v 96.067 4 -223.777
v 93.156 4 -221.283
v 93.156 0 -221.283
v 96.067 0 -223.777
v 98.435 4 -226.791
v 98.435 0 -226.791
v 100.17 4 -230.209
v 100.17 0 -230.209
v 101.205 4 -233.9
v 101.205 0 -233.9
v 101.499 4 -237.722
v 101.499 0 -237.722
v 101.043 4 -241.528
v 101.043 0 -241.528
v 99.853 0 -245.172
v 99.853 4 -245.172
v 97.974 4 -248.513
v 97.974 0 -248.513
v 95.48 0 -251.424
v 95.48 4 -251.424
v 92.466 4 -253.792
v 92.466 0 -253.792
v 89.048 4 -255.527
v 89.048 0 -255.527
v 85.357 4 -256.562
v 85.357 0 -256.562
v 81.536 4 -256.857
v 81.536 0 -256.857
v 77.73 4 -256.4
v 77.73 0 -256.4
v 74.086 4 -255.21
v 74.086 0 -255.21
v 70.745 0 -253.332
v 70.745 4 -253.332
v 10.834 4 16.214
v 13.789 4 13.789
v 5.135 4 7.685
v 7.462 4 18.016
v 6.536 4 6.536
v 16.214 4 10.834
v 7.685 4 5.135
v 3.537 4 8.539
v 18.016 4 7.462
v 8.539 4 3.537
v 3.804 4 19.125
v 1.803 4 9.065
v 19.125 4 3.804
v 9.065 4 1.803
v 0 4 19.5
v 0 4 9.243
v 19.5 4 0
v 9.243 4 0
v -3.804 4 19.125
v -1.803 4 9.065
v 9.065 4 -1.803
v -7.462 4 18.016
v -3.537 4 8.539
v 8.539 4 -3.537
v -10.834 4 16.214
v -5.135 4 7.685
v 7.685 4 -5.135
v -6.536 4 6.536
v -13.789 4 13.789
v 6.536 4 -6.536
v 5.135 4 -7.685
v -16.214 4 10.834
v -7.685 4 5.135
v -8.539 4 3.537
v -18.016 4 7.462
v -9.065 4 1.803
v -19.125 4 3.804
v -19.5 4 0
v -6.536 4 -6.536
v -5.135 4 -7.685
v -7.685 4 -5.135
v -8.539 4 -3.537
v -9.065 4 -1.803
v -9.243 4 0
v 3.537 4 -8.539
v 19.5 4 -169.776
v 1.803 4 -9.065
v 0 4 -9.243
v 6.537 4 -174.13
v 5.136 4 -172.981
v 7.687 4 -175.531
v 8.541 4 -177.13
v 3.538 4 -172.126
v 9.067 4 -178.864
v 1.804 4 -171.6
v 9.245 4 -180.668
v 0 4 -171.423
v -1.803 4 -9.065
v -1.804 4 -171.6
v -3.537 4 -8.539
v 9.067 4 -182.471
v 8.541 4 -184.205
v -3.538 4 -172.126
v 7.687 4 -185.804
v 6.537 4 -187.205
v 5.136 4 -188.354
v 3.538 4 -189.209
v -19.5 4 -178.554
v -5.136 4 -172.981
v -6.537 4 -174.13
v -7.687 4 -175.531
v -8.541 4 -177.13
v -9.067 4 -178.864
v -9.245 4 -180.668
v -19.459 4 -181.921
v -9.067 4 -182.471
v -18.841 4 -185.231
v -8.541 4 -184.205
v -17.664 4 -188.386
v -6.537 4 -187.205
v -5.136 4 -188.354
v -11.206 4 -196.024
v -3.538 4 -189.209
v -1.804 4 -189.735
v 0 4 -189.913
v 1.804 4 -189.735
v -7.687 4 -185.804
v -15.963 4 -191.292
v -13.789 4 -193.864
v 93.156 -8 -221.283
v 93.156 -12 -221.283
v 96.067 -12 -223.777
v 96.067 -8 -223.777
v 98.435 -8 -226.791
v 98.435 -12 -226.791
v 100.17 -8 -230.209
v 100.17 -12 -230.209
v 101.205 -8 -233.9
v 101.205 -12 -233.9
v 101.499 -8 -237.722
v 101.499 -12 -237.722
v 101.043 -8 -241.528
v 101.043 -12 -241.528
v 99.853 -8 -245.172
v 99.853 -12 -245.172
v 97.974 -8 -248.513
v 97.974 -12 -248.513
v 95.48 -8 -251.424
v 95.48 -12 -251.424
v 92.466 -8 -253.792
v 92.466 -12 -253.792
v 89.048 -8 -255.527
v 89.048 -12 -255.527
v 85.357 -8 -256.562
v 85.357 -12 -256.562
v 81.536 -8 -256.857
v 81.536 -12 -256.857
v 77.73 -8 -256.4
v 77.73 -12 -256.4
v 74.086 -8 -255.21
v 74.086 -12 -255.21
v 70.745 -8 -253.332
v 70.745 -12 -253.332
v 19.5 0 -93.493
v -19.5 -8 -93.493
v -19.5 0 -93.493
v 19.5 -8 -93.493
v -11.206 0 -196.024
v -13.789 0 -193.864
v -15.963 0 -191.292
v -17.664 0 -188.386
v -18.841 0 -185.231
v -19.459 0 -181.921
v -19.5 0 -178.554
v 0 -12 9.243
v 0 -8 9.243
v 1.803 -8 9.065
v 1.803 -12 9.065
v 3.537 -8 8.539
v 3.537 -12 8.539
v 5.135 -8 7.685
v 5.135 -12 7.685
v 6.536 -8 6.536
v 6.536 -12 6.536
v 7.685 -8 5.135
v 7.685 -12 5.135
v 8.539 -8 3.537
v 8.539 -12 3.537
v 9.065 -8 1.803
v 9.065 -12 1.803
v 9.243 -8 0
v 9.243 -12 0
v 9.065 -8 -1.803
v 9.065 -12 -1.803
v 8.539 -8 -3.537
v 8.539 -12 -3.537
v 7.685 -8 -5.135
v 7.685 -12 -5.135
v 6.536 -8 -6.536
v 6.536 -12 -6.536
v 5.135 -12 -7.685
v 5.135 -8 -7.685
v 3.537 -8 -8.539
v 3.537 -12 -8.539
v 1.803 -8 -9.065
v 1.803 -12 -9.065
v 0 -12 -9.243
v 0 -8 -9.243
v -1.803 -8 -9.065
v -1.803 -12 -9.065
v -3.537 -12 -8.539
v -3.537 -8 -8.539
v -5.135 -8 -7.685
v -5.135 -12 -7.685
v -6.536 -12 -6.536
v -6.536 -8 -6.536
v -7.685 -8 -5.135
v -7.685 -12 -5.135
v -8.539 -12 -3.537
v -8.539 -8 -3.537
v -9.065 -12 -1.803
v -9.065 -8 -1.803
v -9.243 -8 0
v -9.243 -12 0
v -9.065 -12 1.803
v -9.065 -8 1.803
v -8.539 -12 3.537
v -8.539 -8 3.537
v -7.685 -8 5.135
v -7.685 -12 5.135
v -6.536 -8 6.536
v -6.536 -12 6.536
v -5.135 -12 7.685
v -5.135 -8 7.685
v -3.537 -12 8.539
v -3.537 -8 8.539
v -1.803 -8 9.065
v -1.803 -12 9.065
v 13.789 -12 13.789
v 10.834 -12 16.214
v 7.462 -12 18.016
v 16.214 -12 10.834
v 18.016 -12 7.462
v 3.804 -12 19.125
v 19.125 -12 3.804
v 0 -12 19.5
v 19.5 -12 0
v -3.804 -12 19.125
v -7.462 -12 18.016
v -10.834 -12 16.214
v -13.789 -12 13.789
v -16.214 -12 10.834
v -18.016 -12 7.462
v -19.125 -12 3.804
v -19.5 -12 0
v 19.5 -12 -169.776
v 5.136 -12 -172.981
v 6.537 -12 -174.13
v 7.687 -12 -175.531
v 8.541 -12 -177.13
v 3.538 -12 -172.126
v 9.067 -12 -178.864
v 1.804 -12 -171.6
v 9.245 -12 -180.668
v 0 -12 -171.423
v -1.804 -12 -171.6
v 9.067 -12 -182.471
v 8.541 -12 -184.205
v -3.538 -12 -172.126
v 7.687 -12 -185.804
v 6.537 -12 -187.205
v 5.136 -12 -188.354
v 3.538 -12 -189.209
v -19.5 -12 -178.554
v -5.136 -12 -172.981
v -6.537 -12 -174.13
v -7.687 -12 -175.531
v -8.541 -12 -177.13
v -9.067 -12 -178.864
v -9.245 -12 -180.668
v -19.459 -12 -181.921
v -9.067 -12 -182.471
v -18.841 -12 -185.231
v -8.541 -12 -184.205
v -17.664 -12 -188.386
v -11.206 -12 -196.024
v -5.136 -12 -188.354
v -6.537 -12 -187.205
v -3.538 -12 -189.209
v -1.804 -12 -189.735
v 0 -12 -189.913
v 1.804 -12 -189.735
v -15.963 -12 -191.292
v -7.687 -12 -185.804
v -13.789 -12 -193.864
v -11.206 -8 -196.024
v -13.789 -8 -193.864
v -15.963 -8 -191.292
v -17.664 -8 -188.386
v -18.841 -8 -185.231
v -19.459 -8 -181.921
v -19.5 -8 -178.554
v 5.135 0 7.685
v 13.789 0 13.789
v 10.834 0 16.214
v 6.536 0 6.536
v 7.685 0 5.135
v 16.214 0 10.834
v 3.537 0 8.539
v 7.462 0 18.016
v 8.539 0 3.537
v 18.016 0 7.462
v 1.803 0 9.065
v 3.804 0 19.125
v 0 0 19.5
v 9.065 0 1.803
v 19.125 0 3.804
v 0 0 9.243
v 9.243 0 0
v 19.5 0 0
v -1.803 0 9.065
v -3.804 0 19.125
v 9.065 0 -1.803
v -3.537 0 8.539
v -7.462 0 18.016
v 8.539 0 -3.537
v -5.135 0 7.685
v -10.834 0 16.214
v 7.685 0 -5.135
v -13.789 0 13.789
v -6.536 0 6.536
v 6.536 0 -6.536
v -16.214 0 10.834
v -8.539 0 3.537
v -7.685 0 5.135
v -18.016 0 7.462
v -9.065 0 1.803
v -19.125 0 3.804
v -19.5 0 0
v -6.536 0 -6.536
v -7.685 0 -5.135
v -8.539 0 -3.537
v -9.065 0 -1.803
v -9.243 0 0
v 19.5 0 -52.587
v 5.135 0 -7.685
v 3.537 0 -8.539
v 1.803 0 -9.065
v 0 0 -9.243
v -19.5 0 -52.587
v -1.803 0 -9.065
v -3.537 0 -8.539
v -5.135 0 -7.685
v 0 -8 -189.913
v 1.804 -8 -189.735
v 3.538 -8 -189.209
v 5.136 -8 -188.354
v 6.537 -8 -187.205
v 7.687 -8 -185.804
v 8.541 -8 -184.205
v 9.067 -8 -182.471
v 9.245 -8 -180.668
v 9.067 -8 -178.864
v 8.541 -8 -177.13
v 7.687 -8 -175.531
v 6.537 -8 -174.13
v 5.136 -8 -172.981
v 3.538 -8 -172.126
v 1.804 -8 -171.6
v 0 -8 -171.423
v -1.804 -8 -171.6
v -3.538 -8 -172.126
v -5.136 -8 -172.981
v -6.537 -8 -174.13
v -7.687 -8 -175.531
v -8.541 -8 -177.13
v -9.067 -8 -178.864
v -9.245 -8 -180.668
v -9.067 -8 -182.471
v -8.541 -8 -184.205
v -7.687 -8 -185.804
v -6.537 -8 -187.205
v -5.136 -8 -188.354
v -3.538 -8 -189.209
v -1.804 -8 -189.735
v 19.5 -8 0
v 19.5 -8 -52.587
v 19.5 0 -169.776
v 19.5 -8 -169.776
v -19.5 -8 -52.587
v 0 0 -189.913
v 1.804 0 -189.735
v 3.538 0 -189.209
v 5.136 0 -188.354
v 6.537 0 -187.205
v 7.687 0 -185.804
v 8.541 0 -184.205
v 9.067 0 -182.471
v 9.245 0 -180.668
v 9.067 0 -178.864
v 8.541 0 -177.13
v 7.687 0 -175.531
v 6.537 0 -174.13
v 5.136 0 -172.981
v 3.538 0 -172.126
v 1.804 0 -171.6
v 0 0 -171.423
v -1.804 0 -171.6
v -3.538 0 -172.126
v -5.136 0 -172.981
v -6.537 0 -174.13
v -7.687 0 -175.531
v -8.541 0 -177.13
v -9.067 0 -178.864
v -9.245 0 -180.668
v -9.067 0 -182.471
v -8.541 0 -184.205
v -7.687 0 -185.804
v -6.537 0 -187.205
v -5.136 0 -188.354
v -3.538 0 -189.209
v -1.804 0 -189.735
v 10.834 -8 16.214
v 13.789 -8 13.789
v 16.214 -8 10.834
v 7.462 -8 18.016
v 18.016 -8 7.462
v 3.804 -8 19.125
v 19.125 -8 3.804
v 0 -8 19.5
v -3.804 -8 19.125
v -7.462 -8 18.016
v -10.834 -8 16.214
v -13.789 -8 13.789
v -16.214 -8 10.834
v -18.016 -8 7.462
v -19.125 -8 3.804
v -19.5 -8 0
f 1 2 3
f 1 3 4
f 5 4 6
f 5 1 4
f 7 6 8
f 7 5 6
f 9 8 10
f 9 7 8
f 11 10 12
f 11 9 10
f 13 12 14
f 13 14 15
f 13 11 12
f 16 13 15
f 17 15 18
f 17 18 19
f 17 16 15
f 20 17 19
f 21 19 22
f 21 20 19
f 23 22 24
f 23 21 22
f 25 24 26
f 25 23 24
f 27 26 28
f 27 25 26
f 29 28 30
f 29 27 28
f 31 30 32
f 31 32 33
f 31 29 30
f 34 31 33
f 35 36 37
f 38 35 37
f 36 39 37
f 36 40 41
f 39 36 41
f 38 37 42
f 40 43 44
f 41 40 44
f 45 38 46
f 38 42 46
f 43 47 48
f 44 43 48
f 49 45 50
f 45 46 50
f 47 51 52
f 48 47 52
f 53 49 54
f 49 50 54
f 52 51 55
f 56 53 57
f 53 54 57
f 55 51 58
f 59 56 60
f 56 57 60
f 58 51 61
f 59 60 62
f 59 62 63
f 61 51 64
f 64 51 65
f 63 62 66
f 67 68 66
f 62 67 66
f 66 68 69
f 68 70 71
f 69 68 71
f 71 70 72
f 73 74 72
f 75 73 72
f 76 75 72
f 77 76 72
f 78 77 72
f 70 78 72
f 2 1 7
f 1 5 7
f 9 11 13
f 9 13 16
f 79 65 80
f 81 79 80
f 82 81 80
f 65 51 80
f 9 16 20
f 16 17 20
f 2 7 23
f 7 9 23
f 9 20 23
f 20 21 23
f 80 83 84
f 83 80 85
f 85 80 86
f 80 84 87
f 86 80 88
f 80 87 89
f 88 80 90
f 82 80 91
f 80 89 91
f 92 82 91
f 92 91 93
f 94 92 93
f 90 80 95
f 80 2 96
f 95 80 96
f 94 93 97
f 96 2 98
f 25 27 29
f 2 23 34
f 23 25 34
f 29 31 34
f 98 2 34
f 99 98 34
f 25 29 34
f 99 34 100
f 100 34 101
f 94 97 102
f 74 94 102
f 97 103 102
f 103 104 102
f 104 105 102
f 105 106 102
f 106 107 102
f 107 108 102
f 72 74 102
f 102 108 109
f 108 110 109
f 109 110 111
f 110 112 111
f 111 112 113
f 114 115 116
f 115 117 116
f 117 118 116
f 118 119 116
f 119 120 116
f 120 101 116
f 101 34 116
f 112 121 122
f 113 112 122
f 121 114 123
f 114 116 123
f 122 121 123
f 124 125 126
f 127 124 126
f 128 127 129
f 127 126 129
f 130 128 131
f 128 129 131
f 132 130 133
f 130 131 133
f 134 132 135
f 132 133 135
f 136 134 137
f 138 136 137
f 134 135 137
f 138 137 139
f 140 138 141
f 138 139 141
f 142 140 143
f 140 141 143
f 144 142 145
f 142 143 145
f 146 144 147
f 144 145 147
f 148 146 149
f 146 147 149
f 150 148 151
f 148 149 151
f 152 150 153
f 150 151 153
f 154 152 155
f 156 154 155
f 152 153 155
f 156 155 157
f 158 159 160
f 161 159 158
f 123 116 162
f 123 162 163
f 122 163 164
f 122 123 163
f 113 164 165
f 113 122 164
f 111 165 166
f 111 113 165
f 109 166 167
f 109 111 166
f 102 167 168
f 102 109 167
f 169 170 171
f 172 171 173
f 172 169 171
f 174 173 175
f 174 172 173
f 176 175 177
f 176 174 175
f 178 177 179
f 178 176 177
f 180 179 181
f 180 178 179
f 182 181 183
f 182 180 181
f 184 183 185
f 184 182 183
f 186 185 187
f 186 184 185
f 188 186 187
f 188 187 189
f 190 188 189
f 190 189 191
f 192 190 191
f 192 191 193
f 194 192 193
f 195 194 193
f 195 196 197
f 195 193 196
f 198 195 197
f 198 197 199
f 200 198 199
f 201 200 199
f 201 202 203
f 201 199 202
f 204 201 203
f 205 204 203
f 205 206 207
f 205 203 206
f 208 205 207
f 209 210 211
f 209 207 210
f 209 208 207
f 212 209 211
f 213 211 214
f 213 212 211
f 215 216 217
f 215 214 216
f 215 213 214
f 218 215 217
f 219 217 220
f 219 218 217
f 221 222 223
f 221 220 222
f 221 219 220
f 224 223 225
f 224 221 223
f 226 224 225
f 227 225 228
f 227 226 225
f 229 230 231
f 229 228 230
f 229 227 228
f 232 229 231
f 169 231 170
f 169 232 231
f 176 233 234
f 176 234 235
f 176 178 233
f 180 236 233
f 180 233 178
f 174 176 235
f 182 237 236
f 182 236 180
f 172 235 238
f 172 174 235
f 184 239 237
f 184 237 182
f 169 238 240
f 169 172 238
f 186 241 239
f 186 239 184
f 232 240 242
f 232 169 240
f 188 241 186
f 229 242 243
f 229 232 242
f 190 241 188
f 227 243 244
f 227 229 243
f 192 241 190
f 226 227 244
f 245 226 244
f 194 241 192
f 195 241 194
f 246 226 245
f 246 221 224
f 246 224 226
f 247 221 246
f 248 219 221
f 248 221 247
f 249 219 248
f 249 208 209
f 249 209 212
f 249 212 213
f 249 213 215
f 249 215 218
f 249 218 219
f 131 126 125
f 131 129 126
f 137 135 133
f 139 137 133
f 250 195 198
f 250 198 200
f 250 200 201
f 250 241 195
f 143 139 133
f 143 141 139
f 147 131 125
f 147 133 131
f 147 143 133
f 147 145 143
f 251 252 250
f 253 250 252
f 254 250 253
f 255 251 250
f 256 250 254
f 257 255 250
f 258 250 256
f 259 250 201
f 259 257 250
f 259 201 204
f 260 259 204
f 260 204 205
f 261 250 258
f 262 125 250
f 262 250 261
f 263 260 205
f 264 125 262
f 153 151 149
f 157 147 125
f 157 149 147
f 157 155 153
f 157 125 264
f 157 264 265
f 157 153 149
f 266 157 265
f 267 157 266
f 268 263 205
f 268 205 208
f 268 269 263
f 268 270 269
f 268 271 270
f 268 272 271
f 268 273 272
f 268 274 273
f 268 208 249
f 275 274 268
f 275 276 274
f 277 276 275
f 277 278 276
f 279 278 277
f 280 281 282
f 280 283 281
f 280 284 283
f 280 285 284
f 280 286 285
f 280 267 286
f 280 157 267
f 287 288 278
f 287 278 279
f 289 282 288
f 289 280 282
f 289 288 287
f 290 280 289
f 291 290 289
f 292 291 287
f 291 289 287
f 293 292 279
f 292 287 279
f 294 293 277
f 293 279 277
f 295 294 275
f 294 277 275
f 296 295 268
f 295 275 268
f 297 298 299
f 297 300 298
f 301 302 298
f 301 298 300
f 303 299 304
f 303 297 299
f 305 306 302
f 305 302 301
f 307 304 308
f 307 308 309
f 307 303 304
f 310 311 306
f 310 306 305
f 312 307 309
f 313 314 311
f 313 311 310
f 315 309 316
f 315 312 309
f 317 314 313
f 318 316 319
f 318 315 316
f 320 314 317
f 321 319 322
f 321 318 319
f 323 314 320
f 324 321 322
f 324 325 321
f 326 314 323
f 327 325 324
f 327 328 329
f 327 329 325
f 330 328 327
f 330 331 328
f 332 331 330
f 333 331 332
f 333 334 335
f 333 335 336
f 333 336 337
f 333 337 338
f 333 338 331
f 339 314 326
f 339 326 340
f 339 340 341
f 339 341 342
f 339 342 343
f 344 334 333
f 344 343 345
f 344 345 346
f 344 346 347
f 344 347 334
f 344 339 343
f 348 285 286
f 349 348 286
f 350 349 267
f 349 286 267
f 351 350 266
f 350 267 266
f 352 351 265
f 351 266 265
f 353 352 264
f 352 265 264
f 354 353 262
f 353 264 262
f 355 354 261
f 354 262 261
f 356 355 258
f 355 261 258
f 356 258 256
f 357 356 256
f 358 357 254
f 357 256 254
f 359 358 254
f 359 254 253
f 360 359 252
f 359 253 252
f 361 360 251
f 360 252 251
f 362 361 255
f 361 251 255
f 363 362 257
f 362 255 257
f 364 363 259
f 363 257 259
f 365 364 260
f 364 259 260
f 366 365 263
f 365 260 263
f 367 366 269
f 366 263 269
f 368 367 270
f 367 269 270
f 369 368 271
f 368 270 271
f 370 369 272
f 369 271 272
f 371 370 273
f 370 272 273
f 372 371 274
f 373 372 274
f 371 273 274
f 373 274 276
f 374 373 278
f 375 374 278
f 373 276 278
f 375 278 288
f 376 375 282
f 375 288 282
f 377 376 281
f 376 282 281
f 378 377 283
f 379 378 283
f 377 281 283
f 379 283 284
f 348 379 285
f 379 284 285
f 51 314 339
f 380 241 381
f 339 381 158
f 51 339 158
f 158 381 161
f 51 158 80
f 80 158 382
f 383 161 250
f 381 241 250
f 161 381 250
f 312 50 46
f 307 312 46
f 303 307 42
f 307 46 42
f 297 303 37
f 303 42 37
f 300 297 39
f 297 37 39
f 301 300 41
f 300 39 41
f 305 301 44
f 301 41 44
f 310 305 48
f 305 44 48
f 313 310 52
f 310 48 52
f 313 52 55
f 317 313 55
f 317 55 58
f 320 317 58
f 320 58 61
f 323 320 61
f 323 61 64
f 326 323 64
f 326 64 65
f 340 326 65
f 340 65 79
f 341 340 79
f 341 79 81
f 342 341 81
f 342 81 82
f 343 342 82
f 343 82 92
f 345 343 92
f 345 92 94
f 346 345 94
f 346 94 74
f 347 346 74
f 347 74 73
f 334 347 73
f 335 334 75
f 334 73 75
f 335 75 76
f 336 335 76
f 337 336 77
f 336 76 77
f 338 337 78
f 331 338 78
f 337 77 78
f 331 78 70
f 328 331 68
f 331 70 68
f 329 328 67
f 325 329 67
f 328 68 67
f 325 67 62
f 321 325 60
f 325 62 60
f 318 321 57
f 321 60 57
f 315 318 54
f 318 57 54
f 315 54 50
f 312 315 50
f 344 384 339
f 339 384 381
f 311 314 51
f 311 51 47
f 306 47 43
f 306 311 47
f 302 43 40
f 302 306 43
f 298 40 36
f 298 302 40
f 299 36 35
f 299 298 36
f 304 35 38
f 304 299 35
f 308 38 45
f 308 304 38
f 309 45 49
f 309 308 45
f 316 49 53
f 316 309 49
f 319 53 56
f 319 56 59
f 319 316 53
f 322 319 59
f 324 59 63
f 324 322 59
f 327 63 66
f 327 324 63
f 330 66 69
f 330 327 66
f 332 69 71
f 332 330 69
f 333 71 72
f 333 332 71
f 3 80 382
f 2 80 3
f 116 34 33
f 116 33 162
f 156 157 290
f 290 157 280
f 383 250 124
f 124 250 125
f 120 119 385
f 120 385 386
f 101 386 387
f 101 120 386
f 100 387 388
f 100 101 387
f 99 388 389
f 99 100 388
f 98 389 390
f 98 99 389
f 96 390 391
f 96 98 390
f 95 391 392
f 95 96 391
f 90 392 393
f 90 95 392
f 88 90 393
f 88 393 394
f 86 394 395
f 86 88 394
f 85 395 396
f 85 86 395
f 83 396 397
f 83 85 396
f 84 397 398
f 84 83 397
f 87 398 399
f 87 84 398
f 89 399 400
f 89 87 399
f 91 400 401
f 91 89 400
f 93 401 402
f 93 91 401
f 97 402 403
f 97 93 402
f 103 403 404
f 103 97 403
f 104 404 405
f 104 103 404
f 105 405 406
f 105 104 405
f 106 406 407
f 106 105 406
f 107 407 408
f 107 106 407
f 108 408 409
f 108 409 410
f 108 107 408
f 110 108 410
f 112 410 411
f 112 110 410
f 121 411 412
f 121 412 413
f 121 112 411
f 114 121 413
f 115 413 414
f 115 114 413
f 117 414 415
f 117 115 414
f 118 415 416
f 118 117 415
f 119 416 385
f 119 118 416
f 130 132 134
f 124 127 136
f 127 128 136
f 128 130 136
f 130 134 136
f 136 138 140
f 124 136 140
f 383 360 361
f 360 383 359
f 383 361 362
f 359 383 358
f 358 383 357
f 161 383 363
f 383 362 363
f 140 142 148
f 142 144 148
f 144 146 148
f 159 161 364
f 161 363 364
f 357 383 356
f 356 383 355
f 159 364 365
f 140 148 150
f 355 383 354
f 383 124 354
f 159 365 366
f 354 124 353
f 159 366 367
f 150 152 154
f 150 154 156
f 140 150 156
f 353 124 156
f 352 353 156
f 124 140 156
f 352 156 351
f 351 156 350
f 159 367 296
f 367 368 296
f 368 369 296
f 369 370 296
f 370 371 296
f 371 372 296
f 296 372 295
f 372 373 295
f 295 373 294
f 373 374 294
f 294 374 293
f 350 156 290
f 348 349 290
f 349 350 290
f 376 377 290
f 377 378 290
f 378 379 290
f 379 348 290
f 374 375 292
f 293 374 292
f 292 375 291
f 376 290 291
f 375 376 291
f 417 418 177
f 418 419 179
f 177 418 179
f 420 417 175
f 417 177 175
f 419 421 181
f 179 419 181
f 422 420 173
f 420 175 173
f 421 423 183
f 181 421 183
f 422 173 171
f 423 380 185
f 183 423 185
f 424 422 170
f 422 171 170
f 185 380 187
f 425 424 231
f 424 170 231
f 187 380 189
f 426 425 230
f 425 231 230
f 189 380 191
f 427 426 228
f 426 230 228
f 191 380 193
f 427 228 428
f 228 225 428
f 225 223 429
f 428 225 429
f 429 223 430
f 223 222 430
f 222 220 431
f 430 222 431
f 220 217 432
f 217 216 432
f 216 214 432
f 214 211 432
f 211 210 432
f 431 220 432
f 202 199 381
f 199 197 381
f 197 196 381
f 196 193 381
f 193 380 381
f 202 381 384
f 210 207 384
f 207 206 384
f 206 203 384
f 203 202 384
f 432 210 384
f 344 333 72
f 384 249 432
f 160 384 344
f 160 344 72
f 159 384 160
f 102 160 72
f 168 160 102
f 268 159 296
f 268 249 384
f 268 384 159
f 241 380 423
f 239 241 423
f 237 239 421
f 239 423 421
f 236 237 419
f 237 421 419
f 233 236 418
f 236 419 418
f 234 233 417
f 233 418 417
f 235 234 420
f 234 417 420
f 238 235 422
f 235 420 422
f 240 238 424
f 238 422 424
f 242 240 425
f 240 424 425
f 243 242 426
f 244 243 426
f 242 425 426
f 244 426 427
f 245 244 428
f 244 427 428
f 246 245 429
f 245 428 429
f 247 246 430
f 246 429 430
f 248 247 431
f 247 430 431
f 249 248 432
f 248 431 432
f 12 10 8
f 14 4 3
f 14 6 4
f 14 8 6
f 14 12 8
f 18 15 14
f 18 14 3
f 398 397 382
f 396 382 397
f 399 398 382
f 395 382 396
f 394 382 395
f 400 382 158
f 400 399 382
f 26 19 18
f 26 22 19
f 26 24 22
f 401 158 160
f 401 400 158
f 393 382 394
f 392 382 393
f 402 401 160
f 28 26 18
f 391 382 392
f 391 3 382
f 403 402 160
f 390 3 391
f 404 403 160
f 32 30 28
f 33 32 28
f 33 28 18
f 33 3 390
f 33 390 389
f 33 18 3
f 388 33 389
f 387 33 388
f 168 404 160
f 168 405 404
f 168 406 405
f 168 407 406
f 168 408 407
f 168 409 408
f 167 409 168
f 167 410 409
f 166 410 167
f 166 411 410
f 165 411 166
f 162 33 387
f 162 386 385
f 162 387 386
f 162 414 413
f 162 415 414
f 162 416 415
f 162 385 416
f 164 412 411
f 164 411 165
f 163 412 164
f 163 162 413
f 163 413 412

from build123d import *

# Parameters (mm, degrees)
EXTRUDE_1_DEPTH     = 4
SKETCH_3_R          = 9.242846329
CUT_EXTRUDE_2_DEPTH = 8
SKETCH_5_W          = 39
SKETCH_5_H          = 40.905653917
EXTRUDE_2_DEPTH     = 4
EXTRUDE_3_DEPTH     = 4
SKETCH_8_R          = 9.245
CUT_EXTRUDE_3_DEPTH = 4


with BuildPart() as part:
    # 草图2 → 凸台-拉伸1 (new body)
    with BuildSketch(Plane(origin=(0, 0, 0), x_dir=(1, 0, 0), z_dir=(0, 1, 0))):
        with BuildLine():
            Line((-19.5, 0), (-19.5, 180))
            ThreePointArc((-19.5, 180), (0, 199.5), (19.5, 180))
            Line((19.5, 180), (19.5, 0))
            ThreePointArc((19.5, 0), (0, -19.5), (-19.5, 0))
        make_face()
    extrude_1 = extrude(amount=EXTRUDE_1_DEPTH)

    # 草图3 → 切除-拉伸2 (cut)
    with BuildSketch(Plane(origin=(0, 4, 0), x_dir=(-1, 0, 0), z_dir=(0, 1, 0))):
        with Locations(Location((0, -180, 0), (0, 0, 90))):
            Circle(SKETCH_3_R)
        with Locations(Location((0, 0, 0), (0, 0, 90))):
            Circle(SKETCH_3_R)
    cut_extrude_2 = extrude(amount=-CUT_EXTRUDE_2_DEPTH, mode=Mode.SUBTRACT)

    # 草图5 → 凸台-拉伸2 (add)
    with BuildSketch(Plane(origin=(0, 0, 0), x_dir=(1, 0, 0), z_dir=(0, 1, 0))):
        with Locations((0, 73.039937417)):
            Rectangle(SKETCH_5_W, SKETCH_5_H)
    extrude_2 = extrude(amount=-EXTRUDE_2_DEPTH)

    # 镜向3: 凸台-拉伸1, 切除-拉伸2, 凸台-拉伸2 across plane
    add(extrude_1.mirror(Plane(origin=(0, -4, 0), x_dir=(0, 0, 1), z_dir=(0, -1, 0))))
    add(cut_extrude_2.mirror(Plane(origin=(0, -4, 0), x_dir=(0, 0, 1), z_dir=(0, -1, 0))), mode=Mode.SUBTRACT)
    add(extrude_2.mirror(Plane(origin=(0, -4, 0), x_dir=(0, 0, 1), z_dir=(0, -1, 0))))

    # 草图7 → 凸台-拉伸3 (add)
    with BuildSketch(Plane.XZ.offset(12)):
        with BuildLine():
            Line((11.205673107, -163.975801314), (93.155923926, -221.283360943))
            ThreePointArc((93.155923926, -221.283360943), (97.974449505, -248.513232736), (70.744577713, -253.331758315))
            Line((70.744577713, -253.331758315), (-11.205673107, -196.024198686))
            ThreePointArc((-11.205673107, -196.024198686), (-16.024198686, -168.794326893), (11.205673107, -163.975801314))
        make_face()
    extrude_3 = extrude(amount=-EXTRUDE_3_DEPTH)

    # 草图8 → 切除-拉伸3 (cut)
    with BuildSketch(Plane.XZ.offset(12)):
        with Locations(Location((0, -180.667521799, 0), (0, 0, 270))):
            Circle(SKETCH_8_R)
    cut_extrude_3 = extrude(amount=-CUT_EXTRUDE_3_DEPTH, mode=Mode.SUBTRACT)

    # 镜向6: 凸台-拉伸3, 切除-拉伸3 across plane
    add(extrude_3.mirror(Plane(origin=(0, -4, 0), x_dir=(0, 0, 1), z_dir=(0, -1, 0))))
    add(cut_extrude_3.mirror(Plane(origin=(0, -4, 0), x_dir=(0, 0, 1), z_dir=(0, -1, 0))), mode=Mode.SUBTRACT)


solid = part.part
